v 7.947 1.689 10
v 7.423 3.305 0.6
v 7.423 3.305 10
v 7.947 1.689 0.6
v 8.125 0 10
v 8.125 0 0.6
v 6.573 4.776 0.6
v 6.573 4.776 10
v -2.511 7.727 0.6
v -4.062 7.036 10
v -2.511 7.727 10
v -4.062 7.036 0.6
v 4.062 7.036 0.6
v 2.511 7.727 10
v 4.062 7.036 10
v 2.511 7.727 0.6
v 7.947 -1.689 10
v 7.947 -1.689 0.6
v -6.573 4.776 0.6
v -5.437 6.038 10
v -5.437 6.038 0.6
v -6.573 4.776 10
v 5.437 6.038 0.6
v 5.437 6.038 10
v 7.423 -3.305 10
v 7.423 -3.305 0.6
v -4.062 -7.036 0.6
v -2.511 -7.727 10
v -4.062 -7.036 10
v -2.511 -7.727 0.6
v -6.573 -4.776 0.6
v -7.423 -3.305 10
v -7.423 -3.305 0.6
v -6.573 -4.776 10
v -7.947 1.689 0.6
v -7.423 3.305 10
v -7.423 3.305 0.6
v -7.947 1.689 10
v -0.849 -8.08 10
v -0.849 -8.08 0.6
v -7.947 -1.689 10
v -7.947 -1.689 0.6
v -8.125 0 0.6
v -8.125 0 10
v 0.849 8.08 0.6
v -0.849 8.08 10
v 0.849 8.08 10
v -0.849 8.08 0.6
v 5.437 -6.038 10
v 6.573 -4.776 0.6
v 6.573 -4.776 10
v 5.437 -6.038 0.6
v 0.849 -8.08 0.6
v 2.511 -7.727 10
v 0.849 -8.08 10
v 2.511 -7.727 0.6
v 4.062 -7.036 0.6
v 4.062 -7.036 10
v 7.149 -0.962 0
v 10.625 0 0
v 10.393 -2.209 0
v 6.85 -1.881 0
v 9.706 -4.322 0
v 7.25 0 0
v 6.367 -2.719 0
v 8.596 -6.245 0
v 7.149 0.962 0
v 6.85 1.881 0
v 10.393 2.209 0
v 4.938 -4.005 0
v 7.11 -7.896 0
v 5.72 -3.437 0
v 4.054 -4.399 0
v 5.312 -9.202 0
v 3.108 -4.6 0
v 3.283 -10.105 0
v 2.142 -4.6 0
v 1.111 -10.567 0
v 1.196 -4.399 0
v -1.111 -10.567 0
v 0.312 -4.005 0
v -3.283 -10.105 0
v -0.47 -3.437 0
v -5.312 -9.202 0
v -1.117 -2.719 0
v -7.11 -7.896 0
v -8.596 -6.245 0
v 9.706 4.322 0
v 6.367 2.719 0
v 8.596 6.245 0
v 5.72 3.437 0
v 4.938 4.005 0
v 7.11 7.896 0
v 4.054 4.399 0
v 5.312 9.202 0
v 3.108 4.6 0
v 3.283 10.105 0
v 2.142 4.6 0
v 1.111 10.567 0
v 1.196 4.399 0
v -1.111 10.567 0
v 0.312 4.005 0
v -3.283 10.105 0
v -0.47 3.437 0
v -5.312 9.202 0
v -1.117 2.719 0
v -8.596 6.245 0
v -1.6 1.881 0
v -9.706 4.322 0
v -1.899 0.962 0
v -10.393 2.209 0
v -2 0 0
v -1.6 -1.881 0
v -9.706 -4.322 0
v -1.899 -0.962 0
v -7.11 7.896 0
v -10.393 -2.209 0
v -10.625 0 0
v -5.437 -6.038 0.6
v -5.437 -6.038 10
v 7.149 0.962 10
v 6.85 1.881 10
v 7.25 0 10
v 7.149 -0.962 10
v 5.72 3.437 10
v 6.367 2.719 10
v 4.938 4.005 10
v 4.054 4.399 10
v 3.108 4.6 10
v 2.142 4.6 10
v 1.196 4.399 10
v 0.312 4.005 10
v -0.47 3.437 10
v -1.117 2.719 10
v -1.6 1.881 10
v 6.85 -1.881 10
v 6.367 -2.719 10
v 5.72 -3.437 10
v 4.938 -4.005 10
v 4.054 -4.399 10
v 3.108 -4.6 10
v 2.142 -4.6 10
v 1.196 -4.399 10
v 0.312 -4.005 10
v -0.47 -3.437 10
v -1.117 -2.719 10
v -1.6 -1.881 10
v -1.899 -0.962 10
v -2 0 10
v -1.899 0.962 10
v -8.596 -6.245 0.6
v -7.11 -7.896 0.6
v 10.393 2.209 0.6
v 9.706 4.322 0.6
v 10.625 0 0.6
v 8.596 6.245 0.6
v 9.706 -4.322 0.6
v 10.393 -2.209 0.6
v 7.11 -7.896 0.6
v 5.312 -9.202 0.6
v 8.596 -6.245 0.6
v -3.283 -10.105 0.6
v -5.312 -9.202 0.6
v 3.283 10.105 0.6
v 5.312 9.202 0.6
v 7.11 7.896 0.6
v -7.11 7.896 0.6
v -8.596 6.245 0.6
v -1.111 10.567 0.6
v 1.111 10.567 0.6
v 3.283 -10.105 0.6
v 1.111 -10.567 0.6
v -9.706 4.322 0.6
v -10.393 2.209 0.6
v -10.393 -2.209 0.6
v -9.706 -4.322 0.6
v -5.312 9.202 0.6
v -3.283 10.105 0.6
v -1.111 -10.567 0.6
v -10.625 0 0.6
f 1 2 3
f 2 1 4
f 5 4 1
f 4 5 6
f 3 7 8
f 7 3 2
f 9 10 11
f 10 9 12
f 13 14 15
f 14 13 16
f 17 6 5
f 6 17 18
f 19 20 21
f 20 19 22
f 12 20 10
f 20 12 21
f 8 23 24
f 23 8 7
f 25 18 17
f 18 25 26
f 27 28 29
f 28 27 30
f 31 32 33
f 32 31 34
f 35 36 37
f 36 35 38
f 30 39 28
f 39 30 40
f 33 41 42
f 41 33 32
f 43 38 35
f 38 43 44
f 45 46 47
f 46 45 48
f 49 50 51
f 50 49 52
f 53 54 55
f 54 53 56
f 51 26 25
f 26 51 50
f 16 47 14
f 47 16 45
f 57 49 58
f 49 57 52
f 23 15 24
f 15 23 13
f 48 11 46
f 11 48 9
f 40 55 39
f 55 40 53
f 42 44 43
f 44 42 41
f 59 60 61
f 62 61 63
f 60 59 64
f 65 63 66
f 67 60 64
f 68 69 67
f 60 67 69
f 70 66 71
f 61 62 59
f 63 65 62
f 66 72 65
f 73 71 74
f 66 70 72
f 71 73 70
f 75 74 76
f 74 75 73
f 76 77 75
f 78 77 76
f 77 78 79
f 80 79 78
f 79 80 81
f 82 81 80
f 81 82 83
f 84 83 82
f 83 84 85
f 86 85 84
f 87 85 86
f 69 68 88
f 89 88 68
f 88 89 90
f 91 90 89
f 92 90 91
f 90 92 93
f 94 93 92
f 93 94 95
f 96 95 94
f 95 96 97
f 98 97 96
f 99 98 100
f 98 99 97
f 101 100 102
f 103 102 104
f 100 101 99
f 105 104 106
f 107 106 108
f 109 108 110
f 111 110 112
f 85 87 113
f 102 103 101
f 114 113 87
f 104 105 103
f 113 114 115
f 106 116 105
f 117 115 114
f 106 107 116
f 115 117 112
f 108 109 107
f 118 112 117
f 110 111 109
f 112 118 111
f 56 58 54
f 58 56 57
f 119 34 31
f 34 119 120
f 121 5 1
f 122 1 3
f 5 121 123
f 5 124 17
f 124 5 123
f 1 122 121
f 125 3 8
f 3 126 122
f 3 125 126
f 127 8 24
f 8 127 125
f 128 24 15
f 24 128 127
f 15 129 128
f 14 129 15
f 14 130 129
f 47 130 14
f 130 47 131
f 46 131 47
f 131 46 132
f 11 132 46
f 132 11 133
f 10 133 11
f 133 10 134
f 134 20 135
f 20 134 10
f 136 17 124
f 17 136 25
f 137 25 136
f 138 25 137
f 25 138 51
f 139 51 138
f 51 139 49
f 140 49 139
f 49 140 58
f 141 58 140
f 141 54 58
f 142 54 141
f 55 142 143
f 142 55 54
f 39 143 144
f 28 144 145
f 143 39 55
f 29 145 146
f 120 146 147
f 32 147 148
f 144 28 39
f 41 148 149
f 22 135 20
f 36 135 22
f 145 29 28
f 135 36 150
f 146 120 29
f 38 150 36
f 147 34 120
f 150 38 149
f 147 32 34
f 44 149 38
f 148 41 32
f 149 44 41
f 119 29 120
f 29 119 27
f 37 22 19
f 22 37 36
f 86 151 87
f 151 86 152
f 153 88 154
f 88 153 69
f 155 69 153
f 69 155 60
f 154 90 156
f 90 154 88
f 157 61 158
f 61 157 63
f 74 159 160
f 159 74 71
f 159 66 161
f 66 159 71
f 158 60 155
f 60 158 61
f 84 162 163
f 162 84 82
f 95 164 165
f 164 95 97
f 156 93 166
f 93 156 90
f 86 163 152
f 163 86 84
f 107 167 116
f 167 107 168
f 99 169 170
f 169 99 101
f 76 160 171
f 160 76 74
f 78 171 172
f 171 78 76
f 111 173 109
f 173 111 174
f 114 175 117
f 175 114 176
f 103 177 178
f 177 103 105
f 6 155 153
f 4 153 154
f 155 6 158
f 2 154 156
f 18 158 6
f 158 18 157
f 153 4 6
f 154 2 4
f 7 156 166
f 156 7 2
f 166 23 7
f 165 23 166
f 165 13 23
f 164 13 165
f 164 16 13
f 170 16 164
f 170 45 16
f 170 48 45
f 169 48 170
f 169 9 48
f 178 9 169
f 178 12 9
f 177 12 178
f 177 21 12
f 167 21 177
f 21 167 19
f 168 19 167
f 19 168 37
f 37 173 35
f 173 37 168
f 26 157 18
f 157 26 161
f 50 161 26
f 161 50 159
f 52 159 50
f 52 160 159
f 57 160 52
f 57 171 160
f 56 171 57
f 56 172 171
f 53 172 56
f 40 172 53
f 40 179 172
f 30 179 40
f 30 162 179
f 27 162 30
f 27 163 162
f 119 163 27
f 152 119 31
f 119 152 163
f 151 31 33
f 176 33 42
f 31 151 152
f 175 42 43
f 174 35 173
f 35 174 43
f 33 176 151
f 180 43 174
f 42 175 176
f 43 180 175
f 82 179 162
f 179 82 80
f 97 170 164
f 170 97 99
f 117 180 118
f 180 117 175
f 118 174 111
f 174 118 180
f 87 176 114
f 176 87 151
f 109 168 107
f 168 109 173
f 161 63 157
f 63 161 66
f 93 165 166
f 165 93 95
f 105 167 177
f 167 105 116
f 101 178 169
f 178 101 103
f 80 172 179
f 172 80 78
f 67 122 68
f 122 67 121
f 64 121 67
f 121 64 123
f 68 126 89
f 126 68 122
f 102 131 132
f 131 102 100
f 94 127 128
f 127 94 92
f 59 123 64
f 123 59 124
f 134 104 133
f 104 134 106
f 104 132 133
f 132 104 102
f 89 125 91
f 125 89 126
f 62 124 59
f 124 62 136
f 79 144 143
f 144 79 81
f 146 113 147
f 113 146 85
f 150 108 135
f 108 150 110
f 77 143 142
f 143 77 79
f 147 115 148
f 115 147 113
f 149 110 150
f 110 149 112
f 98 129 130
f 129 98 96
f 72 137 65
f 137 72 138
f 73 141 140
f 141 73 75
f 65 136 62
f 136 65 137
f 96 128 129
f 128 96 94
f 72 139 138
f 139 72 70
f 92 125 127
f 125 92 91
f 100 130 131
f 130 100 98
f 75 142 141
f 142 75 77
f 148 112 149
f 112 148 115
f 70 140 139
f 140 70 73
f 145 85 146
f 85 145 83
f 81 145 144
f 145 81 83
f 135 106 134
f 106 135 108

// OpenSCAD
// [FL_INDEX: keywords="openscad, 3d_parametric, Toilet_Seat_bolt_bushing_shim, csg_solid" | COT="Parametric OpenSCAD design from 3DCodeverse"]
// Title: Toilet Seat bolt bushing/shim

/*
Toilet seat wobble fixer
This bushing shims the bolt to the toilet so the seat won't wiggle so bad

Mike Creuzer - Mike@Creuzer.com - 2012-08-23
Update 2012-12-23 Added offset to allow for elliptical usage for seats that don't exactly align to the center of the stool's holes.
Update 2013-01-14 Tweaked parameter names for customizer

Measurements are dimensionless but assumed to be in mm for most programs.
*/

//Toilet measurement - maybe make this a bit short if your nut is convex
hole_depth = 10;
//Toilet measurement
hole_width = 16.25;

// Bolt measurement
bolt_width = 9.25;

// Part Measurement - Make this a couple of layers for your printer for good results.
brim_height = 0.6; 
// Part Measurement - Shoulder so the shim won't fall out of the hole.
brim_width = 5;
//Percentage to offset the center hole from center.
hole_offset = 75; //  [0:100]
offset = hole_offset * 0.01;
// (factor * by .02) 2 is the default for fast rendering, .01 is as good as it gets. 
curve_quality_percentage = 0.5; // [.5:100]
curve_quality = curve_quality_percentage * .02;

difference()
{
	union()
	{
		cylinder(r = hole_width / 2, h=hole_depth, $fs = curve_quality); // The shim
		cylinder(r = (hole_width + brim_width) / 2, h=brim_height); // the shoulder
	}
	translate(v = [offset * ((hole_width-bolt_width) / 2), 0, 0]) cylinder(r = bolt_width / 2, h=hole_depth, $fs = curve_quality); // The bolt hole
}
